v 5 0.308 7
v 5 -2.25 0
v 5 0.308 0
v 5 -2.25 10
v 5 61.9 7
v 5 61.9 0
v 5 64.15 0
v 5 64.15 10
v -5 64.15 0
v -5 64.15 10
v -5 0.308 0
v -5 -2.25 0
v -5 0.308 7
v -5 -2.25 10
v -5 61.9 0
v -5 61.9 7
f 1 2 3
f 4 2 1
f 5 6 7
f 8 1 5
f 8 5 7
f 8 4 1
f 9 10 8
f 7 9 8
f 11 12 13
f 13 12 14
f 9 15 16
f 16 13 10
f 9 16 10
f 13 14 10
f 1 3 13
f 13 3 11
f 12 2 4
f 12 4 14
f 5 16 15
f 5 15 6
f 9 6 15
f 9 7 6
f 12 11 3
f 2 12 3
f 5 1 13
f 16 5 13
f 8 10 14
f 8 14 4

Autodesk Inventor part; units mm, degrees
ref_plane "YZ Plane" through (0, 0, 0) normal (1, 0, 0) x (0, 1, 0)
sketch "Boceto1" plane through (0, 0, 0) normal (0, 0, 1) x (1, 0, 0)
  line L0 (-5, 0.3078) -> (-5, -2.25) projected
  line L1 (5, -2.25) -> (-5, -2.25) projected
  line L2 (5, 0.3078) -> (5, -2.25) projected
  line L3 (5, 0.3078) -> (-5, 0.3078) projected
  point P0 (0, 0)
extrude "Extrusión1" add sketch "Boceto1" along normal blind 10
sketch "Boceto2" plane through (-5, 0.3078, 0) normal (0, 1, 0) x (1, 0, 0)
  line L0 (10, 0) -> (0, 0) projected
  line L1 (0, 0) -> (0, -10) projected
  line L2 (10, -10) -> (0, -10) projected
  line L3 (10, 0) -> (10, -10) projected
  line L4 (0, 0) -> (0, -10) projected
  line L5 (0, -10) -> (10, -10)
  line L6 (10, -10) -> (10, -5)
  line L7 (10, -5) -> (0, -5)
  line L8 (0, -5) -> (0, -10)
  line L9 (0, -10) -> (10, -10)
  line L10 (10, -10) -> (10, -7)
  line L11 (10, -7) -> (0, -7)
  line L12 (0, -7) -> (0, -10)
  point P0 (5, 0)
  point P1 (0, -5)
ref_plane "Plano de trabajo1" through (-5, 64.15, -70) normal (0, 1, 0) x (0, 0, 1)
extrude "Extrusión2" add sketch "Boceto2" along normal up to surface (63.8422 mm away) contours L3 L2 L1 L11
sketch "Boceto4" plane through (5, 0.3078, 7) normal (0, 0, -1) x (-1, 0, 0)
  line L0 (10, 63.8422) -> (0, 63.8422) projected
  line L1 (10, 0) -> (10, 63.8422) projected
  line L2 (0, 59.3422) -> (0, 63.8422) projected
  line L3 (10, 63.8422) -> (0, 63.8422) projected
  line L4 (10, 59.3422) -> (10, 63.8422) projected
  line L5 (0, 59.3422) -> (10, 59.3422) projected
  line L6 (10, 61.5922) -> (0, 61.5922) projected
  point P0 (5, -0.3078)
ref_plane "Plano de trabajo2" through (-5, 59.65, 0) normal (0, 0, 1) x (1, 0, 0)
extrude "Extrusión4" add sketch "Boceto4" along normal up to surface (7 mm away) contours L1 L6 L2 L0
properties part number "Tope trasero"
